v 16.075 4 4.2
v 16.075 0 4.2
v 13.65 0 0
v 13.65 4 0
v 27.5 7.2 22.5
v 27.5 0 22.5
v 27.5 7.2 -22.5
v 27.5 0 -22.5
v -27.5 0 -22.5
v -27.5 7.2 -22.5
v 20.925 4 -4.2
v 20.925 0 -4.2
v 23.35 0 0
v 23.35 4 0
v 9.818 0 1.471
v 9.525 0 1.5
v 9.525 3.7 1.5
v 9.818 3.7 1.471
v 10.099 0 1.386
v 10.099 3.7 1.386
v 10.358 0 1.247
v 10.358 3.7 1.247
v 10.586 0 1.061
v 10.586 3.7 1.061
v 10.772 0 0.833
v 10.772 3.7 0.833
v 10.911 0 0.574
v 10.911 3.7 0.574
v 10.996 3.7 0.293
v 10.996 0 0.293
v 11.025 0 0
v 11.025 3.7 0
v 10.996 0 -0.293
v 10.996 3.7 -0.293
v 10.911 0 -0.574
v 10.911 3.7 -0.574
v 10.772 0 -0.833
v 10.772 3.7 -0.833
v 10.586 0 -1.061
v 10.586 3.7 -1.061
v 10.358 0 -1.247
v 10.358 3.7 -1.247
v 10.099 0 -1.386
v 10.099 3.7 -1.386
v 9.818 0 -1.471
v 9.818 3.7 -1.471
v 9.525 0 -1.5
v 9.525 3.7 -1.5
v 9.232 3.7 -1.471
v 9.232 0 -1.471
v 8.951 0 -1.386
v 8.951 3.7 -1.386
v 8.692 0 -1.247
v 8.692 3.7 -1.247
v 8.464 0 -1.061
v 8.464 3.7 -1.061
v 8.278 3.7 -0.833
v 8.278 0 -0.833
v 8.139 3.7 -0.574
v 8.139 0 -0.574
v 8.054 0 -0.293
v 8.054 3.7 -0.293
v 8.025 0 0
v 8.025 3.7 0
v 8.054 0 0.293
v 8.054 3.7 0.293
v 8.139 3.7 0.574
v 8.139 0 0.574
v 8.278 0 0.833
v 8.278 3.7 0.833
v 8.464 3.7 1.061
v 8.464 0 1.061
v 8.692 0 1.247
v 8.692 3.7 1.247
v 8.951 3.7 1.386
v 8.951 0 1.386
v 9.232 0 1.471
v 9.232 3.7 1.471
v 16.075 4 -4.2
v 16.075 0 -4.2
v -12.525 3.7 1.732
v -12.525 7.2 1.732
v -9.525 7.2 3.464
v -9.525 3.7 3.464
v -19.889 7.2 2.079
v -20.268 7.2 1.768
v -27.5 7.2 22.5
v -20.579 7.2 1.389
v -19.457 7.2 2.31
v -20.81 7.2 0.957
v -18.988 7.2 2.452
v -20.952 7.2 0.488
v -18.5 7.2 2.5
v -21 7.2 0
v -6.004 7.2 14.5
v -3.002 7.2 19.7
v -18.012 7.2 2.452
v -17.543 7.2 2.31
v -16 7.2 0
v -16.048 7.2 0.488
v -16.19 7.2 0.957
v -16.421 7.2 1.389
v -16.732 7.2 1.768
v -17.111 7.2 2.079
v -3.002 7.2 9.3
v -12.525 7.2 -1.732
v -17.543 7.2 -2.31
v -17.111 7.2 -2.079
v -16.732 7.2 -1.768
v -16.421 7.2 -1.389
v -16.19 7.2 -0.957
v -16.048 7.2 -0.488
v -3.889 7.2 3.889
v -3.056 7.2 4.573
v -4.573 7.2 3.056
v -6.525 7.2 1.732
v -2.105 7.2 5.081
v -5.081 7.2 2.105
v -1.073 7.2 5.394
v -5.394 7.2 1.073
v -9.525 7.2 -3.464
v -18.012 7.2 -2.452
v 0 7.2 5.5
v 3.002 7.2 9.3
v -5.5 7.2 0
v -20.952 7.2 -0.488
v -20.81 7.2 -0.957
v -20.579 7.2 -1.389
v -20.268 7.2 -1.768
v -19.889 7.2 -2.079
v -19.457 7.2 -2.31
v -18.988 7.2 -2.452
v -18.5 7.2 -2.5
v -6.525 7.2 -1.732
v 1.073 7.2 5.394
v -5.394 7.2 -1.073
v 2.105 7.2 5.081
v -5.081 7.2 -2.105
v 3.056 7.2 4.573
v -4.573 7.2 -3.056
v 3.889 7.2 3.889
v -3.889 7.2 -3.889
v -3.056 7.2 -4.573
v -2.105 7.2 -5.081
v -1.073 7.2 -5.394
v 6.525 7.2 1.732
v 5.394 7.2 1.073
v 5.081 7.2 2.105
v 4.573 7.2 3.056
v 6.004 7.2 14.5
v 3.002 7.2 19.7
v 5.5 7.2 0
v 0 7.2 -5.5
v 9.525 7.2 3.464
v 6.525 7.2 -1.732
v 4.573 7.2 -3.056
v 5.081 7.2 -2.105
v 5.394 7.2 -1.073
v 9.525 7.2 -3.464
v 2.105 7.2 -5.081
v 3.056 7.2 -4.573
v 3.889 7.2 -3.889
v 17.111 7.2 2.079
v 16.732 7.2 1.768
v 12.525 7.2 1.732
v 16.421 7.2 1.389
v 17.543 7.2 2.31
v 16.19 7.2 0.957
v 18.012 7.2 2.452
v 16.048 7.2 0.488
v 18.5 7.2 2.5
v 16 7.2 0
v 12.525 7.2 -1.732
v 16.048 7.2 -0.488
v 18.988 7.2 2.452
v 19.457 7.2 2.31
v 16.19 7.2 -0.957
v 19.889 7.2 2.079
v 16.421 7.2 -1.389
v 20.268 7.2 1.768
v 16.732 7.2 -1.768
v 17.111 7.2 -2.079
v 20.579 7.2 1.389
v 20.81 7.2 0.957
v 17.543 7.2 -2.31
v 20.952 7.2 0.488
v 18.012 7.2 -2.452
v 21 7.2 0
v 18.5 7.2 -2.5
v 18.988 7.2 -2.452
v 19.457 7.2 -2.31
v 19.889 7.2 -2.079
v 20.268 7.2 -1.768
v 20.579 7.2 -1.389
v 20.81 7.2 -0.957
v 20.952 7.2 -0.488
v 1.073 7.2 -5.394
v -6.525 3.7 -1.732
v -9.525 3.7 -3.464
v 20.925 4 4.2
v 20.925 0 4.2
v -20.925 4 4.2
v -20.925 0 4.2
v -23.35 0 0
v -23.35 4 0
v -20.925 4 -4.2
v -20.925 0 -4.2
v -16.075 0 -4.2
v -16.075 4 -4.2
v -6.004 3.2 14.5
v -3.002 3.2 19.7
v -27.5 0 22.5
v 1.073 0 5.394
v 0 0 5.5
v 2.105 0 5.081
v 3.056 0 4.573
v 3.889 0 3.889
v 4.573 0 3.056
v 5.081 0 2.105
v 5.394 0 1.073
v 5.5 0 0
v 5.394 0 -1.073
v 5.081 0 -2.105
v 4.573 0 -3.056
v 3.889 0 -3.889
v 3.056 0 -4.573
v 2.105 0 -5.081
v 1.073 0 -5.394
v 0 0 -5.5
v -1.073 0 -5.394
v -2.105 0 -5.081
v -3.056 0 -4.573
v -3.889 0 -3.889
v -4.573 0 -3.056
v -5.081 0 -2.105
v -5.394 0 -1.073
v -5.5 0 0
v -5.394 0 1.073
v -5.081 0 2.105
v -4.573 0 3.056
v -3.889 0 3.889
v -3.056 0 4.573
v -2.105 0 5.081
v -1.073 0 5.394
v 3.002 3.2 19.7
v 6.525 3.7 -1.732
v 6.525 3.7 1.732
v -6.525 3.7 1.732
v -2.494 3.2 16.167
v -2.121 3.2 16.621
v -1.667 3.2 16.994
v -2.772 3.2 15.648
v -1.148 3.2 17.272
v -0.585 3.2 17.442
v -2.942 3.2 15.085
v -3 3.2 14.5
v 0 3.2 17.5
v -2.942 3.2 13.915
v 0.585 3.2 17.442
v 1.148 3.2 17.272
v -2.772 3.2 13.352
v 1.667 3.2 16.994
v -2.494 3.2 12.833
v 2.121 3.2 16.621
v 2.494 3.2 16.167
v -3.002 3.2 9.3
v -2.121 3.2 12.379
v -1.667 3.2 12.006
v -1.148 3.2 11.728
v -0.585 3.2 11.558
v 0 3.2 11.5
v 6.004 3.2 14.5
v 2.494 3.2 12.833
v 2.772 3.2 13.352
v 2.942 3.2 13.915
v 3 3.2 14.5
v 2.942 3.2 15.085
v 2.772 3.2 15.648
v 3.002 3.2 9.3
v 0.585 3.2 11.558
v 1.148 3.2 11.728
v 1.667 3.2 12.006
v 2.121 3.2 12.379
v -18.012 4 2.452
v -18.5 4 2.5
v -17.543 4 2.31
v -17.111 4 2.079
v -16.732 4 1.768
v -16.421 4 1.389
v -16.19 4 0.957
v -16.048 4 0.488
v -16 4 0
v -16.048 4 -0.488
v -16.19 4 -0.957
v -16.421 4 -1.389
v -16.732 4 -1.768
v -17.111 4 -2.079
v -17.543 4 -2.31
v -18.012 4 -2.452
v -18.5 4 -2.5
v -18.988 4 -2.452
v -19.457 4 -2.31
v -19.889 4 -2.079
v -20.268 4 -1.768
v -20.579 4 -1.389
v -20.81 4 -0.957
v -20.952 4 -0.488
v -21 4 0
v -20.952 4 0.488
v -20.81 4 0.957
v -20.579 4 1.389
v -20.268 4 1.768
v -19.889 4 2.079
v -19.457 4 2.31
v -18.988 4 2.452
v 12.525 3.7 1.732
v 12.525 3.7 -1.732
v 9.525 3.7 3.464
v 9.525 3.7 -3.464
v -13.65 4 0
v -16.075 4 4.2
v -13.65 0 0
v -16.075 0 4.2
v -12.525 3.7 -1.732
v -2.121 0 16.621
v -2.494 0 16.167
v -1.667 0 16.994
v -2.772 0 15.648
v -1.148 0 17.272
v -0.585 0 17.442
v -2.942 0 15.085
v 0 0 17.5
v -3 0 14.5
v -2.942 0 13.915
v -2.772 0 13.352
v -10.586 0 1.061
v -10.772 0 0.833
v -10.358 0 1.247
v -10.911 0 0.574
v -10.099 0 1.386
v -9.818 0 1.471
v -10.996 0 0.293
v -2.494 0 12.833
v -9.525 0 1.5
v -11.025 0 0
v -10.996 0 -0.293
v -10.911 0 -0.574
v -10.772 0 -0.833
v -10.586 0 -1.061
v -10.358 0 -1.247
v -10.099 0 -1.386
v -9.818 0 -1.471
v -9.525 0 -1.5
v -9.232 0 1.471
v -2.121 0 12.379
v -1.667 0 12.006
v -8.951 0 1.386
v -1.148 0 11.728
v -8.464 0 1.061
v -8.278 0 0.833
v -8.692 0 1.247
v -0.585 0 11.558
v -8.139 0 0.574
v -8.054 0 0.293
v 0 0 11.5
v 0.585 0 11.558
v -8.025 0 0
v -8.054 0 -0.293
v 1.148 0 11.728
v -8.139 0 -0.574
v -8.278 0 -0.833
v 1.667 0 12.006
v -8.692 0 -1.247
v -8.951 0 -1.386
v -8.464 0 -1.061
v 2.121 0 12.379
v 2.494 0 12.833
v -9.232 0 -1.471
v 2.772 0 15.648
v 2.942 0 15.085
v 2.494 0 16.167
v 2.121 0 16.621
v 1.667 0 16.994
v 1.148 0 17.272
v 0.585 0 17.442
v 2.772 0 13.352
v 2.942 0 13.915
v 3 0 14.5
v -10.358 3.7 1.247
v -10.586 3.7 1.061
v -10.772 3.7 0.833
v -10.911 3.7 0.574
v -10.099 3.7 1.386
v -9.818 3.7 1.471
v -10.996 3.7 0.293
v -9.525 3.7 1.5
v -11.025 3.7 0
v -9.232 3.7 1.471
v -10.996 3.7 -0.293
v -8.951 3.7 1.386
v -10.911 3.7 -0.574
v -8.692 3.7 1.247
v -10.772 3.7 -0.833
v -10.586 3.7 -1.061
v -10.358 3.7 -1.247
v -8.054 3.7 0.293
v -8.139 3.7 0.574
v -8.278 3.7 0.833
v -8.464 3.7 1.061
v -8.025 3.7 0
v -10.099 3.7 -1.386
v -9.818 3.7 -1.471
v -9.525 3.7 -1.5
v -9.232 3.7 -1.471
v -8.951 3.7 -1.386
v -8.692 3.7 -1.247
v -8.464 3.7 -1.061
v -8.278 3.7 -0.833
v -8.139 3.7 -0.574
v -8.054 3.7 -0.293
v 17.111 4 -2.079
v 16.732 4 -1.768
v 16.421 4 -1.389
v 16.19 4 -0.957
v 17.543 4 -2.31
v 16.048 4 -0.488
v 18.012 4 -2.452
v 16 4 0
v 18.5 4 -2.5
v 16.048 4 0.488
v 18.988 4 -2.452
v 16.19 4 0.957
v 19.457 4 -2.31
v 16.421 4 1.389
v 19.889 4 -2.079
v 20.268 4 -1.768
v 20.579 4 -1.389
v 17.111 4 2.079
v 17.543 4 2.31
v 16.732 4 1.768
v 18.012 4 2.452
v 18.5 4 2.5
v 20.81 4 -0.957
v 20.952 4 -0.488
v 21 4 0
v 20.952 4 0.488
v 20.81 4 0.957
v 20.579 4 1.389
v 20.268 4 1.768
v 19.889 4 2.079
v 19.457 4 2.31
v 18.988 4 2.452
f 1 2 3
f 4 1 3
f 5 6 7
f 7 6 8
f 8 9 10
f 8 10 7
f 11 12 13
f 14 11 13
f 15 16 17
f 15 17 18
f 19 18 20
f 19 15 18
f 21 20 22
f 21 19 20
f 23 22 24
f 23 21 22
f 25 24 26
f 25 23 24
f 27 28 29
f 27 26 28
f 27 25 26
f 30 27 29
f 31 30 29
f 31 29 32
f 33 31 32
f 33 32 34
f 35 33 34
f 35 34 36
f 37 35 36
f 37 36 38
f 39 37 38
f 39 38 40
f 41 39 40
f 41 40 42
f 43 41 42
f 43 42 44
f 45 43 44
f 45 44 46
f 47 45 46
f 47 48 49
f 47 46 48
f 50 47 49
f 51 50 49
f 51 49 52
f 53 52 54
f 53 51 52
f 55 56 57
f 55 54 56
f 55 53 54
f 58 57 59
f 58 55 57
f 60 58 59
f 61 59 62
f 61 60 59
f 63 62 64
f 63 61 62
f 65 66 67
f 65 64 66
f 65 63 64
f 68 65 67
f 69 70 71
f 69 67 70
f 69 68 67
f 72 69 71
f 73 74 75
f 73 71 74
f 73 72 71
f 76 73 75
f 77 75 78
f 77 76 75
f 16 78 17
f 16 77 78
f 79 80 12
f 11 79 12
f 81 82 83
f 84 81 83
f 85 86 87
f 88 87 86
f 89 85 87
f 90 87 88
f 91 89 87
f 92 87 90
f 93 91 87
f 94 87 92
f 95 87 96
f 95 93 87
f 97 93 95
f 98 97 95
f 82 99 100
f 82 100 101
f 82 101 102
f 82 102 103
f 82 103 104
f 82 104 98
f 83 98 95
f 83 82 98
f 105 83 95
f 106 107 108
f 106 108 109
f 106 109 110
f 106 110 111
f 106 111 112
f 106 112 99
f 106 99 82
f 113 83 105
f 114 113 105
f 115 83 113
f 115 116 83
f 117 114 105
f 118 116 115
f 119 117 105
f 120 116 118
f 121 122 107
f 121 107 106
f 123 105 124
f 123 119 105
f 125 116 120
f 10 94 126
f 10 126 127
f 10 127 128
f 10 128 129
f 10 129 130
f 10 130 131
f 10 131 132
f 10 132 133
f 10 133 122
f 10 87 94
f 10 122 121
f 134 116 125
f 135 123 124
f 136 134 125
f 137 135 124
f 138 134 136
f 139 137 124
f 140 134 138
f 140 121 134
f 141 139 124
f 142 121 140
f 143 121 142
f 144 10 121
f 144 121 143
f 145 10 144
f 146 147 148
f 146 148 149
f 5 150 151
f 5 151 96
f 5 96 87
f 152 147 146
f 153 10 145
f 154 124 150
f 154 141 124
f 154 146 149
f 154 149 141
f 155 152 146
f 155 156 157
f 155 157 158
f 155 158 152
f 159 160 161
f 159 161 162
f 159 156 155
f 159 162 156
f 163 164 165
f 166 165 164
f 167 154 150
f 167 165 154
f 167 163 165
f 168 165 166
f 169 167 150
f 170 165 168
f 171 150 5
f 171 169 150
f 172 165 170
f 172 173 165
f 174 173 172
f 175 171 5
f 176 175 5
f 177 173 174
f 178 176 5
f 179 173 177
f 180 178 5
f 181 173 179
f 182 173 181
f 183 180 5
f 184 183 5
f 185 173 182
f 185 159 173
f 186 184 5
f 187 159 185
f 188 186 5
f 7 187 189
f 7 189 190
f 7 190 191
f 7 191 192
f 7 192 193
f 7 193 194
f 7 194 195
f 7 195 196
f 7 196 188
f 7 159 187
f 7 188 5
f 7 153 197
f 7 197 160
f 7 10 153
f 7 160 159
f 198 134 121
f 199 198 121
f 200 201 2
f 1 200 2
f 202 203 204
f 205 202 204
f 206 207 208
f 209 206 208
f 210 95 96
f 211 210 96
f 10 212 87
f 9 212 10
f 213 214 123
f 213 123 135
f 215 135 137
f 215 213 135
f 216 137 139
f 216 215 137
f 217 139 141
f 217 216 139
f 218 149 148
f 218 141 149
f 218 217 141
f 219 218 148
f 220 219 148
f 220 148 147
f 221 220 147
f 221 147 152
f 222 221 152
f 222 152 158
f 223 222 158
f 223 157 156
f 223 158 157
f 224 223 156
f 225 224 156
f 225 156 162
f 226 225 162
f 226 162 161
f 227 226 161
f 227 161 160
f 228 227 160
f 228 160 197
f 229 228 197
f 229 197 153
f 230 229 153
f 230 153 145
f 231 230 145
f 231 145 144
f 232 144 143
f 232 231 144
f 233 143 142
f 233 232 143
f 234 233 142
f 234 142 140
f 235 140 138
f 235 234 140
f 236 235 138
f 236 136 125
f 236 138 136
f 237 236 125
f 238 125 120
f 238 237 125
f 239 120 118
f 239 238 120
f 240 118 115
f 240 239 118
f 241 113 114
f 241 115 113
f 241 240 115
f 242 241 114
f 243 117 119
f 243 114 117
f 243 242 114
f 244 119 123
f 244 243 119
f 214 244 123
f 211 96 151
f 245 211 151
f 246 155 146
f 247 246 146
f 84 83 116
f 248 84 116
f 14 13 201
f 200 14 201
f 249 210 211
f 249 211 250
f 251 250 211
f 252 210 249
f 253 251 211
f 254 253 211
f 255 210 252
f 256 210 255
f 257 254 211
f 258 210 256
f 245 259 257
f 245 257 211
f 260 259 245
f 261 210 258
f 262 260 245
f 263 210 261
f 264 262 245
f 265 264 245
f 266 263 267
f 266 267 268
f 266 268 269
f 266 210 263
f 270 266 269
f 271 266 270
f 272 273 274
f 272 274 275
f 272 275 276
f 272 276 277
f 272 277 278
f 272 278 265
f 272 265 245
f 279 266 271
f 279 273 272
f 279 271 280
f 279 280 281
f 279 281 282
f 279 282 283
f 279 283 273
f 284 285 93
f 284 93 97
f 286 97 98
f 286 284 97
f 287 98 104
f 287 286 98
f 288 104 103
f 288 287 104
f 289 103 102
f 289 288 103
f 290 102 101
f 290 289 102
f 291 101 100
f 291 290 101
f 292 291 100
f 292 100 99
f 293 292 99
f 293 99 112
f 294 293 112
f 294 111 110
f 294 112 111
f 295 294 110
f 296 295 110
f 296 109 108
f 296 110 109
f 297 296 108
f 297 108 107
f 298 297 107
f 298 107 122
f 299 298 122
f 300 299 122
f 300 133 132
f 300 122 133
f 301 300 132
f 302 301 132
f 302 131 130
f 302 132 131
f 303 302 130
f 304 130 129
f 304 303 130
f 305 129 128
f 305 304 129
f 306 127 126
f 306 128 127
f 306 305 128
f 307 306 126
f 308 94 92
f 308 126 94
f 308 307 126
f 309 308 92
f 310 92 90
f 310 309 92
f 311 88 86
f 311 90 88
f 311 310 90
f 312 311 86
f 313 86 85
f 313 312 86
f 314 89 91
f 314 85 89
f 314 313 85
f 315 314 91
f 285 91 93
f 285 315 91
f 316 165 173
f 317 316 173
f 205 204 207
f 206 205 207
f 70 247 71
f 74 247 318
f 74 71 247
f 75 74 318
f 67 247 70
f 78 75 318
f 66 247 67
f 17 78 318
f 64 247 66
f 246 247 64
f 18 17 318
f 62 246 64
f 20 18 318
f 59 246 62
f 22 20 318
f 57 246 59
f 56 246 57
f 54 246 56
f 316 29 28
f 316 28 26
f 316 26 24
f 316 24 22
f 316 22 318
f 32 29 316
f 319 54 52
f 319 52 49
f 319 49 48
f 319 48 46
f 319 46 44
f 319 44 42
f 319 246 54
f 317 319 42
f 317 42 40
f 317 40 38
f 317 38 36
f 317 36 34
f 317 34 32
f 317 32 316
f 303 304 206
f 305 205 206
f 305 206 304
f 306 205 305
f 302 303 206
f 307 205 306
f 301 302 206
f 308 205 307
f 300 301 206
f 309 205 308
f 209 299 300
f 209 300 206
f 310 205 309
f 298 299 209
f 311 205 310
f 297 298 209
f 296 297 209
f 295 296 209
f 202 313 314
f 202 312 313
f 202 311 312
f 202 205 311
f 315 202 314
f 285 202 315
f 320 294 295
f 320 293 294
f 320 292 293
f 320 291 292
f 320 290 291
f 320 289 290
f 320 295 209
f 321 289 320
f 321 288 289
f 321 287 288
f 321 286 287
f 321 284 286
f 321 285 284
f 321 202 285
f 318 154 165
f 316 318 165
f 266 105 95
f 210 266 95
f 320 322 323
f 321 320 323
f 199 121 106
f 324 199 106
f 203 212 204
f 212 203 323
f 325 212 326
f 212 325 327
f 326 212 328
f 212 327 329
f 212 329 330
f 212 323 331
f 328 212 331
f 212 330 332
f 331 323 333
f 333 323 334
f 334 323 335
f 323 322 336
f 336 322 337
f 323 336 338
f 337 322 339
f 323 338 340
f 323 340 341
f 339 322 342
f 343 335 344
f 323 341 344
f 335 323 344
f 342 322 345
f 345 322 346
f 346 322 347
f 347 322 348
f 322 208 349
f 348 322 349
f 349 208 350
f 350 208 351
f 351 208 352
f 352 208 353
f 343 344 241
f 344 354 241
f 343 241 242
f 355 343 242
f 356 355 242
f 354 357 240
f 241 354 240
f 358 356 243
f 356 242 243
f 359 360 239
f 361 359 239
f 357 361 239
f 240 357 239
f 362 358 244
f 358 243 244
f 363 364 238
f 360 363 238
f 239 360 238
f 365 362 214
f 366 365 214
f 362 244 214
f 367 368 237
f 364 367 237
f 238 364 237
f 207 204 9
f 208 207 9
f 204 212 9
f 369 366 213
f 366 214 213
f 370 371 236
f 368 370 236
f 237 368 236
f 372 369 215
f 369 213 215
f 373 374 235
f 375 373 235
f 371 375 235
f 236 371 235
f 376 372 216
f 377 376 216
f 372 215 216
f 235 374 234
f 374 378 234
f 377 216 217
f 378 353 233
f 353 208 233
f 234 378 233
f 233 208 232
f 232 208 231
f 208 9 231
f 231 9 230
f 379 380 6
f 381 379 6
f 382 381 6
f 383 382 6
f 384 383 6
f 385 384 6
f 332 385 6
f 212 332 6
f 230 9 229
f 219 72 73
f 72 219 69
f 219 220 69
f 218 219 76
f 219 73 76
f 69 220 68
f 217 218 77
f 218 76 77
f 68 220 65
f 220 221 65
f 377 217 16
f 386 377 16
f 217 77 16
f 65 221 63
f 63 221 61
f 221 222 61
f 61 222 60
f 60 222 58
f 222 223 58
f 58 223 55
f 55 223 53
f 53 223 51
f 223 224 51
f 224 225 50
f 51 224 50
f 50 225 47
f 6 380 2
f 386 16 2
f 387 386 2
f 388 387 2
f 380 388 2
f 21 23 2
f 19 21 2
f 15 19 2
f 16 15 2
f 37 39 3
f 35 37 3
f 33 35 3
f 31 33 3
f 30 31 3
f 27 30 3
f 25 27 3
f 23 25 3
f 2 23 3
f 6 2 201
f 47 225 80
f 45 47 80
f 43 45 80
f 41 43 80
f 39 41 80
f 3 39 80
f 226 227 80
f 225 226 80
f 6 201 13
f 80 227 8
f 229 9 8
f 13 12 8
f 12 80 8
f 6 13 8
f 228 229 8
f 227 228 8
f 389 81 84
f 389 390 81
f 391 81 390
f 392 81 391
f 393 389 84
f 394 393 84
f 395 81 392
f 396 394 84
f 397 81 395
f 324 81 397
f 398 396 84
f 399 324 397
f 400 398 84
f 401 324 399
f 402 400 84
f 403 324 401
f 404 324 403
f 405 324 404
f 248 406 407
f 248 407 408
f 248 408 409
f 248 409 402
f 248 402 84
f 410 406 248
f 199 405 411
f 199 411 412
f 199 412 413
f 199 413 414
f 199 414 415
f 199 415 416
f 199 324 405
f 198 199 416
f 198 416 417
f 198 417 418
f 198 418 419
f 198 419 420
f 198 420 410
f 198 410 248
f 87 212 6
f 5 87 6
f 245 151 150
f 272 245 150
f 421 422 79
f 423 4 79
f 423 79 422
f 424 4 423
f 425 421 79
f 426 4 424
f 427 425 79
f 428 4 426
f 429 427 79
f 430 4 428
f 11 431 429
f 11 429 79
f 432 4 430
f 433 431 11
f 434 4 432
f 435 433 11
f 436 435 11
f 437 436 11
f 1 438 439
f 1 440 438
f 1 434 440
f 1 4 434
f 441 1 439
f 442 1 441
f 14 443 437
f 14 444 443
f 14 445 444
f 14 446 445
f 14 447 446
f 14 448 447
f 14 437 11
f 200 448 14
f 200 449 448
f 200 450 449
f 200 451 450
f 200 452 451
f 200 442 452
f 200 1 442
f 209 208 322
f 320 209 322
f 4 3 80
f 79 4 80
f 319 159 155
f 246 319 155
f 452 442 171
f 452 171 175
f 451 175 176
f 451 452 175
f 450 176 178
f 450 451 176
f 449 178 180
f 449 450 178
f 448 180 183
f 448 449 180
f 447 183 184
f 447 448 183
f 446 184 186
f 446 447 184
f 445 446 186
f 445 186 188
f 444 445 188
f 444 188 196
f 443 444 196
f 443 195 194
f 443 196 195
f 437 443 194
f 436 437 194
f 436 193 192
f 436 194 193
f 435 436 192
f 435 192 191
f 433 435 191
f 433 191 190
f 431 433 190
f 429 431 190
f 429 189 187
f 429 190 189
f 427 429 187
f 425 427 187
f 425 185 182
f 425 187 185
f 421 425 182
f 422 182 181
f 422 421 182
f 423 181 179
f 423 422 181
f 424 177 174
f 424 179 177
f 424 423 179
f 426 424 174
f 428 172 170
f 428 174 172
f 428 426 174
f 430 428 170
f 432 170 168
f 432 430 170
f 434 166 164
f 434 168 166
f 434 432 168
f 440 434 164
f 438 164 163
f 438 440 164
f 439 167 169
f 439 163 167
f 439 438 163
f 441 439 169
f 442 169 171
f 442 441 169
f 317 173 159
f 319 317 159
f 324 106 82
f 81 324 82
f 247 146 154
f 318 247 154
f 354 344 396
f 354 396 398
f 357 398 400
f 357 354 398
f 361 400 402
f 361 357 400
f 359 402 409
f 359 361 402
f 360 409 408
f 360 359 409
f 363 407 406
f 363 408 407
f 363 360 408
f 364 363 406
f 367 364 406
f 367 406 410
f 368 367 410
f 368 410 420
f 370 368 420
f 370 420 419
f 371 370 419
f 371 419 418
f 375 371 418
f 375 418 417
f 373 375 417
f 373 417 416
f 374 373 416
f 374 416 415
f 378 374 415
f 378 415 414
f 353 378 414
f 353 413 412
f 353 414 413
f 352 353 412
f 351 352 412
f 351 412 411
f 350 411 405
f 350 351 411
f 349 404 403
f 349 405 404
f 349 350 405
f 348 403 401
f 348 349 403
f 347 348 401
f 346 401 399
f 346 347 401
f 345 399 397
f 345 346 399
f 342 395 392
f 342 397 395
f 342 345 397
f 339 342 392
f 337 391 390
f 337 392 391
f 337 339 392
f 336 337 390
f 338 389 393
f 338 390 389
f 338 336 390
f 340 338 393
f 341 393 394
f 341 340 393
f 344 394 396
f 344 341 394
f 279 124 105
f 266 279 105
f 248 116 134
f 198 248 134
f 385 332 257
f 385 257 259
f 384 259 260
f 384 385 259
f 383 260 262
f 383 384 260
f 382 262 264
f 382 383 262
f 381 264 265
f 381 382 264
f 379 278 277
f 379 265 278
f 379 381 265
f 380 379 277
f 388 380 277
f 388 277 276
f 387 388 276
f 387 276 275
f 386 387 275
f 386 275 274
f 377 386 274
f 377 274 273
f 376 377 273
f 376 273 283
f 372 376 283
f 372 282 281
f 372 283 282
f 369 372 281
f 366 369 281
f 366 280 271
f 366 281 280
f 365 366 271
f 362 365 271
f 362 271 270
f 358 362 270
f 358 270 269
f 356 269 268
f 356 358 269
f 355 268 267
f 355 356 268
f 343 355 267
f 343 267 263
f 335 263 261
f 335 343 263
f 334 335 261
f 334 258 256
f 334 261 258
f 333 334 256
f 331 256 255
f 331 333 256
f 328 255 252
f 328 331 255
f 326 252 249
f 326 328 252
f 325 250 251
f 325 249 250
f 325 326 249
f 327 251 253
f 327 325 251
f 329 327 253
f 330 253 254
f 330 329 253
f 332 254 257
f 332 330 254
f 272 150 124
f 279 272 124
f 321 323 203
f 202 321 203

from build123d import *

# Parameters (mm, degrees)
SKETCH1_W               = 55
SKETCH1_H               = 45
BOSS_EXTRUDE1_DEPTH     = 7.2
CUT_EXTRUDE1_DEPTH      = 37.253827384
CUT_EXTRUDE1_DEPTH_BACK = 37.253827384
SKETCH2_R               = 5.5
SKETCH2_R_2             = 2.5
SKETCH2_R_3             = 1.5
CUT_EXTRUDE2_DEPTH      = 3.5
CUT_EXTRUDE3_DEPTH      = 4
CUT_EXTRUDE4_DEPTH      = 37.253827384
CUT_EXTRUDE4_DEPTH_BACK = 37.253827384
SKETCH7_R               = 3
CUT_EXTRUDE5_DEPTH      = 4


with BuildPart() as part:
    # Sketch1 → Boss-Extrude1 (new body)
    with BuildSketch(Plane(origin=(0, 0, 0), x_dir=(1, 0, 0), z_dir=(0, 1, 0))):
        Rectangle(SKETCH1_W, SKETCH1_H)
    extrude(amount=BOSS_EXTRUDE1_DEPTH)

    # Sketch2 → Cut-Extrude1 (cut, two sides: drawn at the far end of the back side and taken through both)
    with BuildSketch(Plane(origin=(0, 7.2, 0), x_dir=(1, 0, 0), z_dir=(0, 1, 0)).offset(-CUT_EXTRUDE1_DEPTH_BACK)):
        with Locations(Location((0, 0, 0), (0, 0, 270))):
            Circle(SKETCH2_R)
        with Locations(Location((-18.5, 0, 0), (0, 0, 270))):
            Circle(SKETCH2_R_2)
        with Locations(Location((18.5, 0, 0), (0, 0, 270))):
            Circle(SKETCH2_R_2)
        with Locations(Location((-9.525, 0, 0), (0, 0, 270))):
            Circle(SKETCH2_R_3)
        with Locations(Location((9.525, 0, 0), (0, 0, 270))):
            Circle(SKETCH2_R_3)
    extrude(amount=CUT_EXTRUDE1_DEPTH + CUT_EXTRUDE1_DEPTH_BACK, mode=Mode.SUBTRACT)

    # Sketch3 → Cut-Extrude2 (cut)
    with BuildSketch(Plane(origin=(0, 7.2, 0), x_dir=(1, 0, 0), z_dir=(0, 1, 0))):
        Polygon((-9.525, 3.464101615), (-12.525, 1.732050808), (-12.525, -1.732050808), (-9.525, -3.464101615), (-6.525, -1.732050808), (-6.525, 1.732050808), align=None)
        Polygon((9.525, 3.464101615), (6.525, 1.732050808), (6.525, -1.732050808), (9.525, -3.464101615), (12.525, -1.732050808), (12.525, 1.732050808), align=None)
    extrude(amount=-CUT_EXTRUDE2_DEPTH, mode=Mode.SUBTRACT)

    # Sketch5 → Cut-Extrude3 (cut)
    with BuildSketch(Plane.XZ):
        Polygon((23.349742261, 0), (20.924871131, 4.2), (16.075128869, 4.2), (13.650257739, 0), (16.075128869, -4.2), (20.924871131, -4.2), align=None)
        Polygon((-13.650257739, 0), (-16.075128869, 4.2), (-20.924871131, 4.2), (-23.349742261, 0), (-20.924871131, -4.2), (-16.075128869, -4.2), align=None)
    extrude(amount=-CUT_EXTRUDE3_DEPTH, mode=Mode.SUBTRACT)

    # Sketch7 → Cut-Extrude4 (cut, two sides: drawn at the far end of the back side and taken through both)
    with BuildSketch(Plane(origin=(0, 7.2, 0), x_dir=(1, 0, 0), z_dir=(0, 1, 0)).offset(-CUT_EXTRUDE4_DEPTH_BACK)):
        with Locations(Location((0, -14.5, 0), (0, 0, 270))):
            Circle(SKETCH7_R)
    extrude(amount=CUT_EXTRUDE4_DEPTH + CUT_EXTRUDE4_DEPTH_BACK, mode=Mode.SUBTRACT)

    # Sketch8 → Cut-Extrude5 (cut)
    with BuildSketch(Plane(origin=(0, 7.2, 0), x_dir=(1, 0, 0), z_dir=(0, 1, 0))):
        Polygon((6.0044428, -14.5), (3.0022214, -9.3), (-3.0022214, -9.3), (-6.0044428, -14.5), (-3.0022214, -19.7), (3.0022214, -19.7), align=None)
    extrude(amount=-CUT_EXTRUDE5_DEPTH, mode=Mode.SUBTRACT)


solid = part.part
